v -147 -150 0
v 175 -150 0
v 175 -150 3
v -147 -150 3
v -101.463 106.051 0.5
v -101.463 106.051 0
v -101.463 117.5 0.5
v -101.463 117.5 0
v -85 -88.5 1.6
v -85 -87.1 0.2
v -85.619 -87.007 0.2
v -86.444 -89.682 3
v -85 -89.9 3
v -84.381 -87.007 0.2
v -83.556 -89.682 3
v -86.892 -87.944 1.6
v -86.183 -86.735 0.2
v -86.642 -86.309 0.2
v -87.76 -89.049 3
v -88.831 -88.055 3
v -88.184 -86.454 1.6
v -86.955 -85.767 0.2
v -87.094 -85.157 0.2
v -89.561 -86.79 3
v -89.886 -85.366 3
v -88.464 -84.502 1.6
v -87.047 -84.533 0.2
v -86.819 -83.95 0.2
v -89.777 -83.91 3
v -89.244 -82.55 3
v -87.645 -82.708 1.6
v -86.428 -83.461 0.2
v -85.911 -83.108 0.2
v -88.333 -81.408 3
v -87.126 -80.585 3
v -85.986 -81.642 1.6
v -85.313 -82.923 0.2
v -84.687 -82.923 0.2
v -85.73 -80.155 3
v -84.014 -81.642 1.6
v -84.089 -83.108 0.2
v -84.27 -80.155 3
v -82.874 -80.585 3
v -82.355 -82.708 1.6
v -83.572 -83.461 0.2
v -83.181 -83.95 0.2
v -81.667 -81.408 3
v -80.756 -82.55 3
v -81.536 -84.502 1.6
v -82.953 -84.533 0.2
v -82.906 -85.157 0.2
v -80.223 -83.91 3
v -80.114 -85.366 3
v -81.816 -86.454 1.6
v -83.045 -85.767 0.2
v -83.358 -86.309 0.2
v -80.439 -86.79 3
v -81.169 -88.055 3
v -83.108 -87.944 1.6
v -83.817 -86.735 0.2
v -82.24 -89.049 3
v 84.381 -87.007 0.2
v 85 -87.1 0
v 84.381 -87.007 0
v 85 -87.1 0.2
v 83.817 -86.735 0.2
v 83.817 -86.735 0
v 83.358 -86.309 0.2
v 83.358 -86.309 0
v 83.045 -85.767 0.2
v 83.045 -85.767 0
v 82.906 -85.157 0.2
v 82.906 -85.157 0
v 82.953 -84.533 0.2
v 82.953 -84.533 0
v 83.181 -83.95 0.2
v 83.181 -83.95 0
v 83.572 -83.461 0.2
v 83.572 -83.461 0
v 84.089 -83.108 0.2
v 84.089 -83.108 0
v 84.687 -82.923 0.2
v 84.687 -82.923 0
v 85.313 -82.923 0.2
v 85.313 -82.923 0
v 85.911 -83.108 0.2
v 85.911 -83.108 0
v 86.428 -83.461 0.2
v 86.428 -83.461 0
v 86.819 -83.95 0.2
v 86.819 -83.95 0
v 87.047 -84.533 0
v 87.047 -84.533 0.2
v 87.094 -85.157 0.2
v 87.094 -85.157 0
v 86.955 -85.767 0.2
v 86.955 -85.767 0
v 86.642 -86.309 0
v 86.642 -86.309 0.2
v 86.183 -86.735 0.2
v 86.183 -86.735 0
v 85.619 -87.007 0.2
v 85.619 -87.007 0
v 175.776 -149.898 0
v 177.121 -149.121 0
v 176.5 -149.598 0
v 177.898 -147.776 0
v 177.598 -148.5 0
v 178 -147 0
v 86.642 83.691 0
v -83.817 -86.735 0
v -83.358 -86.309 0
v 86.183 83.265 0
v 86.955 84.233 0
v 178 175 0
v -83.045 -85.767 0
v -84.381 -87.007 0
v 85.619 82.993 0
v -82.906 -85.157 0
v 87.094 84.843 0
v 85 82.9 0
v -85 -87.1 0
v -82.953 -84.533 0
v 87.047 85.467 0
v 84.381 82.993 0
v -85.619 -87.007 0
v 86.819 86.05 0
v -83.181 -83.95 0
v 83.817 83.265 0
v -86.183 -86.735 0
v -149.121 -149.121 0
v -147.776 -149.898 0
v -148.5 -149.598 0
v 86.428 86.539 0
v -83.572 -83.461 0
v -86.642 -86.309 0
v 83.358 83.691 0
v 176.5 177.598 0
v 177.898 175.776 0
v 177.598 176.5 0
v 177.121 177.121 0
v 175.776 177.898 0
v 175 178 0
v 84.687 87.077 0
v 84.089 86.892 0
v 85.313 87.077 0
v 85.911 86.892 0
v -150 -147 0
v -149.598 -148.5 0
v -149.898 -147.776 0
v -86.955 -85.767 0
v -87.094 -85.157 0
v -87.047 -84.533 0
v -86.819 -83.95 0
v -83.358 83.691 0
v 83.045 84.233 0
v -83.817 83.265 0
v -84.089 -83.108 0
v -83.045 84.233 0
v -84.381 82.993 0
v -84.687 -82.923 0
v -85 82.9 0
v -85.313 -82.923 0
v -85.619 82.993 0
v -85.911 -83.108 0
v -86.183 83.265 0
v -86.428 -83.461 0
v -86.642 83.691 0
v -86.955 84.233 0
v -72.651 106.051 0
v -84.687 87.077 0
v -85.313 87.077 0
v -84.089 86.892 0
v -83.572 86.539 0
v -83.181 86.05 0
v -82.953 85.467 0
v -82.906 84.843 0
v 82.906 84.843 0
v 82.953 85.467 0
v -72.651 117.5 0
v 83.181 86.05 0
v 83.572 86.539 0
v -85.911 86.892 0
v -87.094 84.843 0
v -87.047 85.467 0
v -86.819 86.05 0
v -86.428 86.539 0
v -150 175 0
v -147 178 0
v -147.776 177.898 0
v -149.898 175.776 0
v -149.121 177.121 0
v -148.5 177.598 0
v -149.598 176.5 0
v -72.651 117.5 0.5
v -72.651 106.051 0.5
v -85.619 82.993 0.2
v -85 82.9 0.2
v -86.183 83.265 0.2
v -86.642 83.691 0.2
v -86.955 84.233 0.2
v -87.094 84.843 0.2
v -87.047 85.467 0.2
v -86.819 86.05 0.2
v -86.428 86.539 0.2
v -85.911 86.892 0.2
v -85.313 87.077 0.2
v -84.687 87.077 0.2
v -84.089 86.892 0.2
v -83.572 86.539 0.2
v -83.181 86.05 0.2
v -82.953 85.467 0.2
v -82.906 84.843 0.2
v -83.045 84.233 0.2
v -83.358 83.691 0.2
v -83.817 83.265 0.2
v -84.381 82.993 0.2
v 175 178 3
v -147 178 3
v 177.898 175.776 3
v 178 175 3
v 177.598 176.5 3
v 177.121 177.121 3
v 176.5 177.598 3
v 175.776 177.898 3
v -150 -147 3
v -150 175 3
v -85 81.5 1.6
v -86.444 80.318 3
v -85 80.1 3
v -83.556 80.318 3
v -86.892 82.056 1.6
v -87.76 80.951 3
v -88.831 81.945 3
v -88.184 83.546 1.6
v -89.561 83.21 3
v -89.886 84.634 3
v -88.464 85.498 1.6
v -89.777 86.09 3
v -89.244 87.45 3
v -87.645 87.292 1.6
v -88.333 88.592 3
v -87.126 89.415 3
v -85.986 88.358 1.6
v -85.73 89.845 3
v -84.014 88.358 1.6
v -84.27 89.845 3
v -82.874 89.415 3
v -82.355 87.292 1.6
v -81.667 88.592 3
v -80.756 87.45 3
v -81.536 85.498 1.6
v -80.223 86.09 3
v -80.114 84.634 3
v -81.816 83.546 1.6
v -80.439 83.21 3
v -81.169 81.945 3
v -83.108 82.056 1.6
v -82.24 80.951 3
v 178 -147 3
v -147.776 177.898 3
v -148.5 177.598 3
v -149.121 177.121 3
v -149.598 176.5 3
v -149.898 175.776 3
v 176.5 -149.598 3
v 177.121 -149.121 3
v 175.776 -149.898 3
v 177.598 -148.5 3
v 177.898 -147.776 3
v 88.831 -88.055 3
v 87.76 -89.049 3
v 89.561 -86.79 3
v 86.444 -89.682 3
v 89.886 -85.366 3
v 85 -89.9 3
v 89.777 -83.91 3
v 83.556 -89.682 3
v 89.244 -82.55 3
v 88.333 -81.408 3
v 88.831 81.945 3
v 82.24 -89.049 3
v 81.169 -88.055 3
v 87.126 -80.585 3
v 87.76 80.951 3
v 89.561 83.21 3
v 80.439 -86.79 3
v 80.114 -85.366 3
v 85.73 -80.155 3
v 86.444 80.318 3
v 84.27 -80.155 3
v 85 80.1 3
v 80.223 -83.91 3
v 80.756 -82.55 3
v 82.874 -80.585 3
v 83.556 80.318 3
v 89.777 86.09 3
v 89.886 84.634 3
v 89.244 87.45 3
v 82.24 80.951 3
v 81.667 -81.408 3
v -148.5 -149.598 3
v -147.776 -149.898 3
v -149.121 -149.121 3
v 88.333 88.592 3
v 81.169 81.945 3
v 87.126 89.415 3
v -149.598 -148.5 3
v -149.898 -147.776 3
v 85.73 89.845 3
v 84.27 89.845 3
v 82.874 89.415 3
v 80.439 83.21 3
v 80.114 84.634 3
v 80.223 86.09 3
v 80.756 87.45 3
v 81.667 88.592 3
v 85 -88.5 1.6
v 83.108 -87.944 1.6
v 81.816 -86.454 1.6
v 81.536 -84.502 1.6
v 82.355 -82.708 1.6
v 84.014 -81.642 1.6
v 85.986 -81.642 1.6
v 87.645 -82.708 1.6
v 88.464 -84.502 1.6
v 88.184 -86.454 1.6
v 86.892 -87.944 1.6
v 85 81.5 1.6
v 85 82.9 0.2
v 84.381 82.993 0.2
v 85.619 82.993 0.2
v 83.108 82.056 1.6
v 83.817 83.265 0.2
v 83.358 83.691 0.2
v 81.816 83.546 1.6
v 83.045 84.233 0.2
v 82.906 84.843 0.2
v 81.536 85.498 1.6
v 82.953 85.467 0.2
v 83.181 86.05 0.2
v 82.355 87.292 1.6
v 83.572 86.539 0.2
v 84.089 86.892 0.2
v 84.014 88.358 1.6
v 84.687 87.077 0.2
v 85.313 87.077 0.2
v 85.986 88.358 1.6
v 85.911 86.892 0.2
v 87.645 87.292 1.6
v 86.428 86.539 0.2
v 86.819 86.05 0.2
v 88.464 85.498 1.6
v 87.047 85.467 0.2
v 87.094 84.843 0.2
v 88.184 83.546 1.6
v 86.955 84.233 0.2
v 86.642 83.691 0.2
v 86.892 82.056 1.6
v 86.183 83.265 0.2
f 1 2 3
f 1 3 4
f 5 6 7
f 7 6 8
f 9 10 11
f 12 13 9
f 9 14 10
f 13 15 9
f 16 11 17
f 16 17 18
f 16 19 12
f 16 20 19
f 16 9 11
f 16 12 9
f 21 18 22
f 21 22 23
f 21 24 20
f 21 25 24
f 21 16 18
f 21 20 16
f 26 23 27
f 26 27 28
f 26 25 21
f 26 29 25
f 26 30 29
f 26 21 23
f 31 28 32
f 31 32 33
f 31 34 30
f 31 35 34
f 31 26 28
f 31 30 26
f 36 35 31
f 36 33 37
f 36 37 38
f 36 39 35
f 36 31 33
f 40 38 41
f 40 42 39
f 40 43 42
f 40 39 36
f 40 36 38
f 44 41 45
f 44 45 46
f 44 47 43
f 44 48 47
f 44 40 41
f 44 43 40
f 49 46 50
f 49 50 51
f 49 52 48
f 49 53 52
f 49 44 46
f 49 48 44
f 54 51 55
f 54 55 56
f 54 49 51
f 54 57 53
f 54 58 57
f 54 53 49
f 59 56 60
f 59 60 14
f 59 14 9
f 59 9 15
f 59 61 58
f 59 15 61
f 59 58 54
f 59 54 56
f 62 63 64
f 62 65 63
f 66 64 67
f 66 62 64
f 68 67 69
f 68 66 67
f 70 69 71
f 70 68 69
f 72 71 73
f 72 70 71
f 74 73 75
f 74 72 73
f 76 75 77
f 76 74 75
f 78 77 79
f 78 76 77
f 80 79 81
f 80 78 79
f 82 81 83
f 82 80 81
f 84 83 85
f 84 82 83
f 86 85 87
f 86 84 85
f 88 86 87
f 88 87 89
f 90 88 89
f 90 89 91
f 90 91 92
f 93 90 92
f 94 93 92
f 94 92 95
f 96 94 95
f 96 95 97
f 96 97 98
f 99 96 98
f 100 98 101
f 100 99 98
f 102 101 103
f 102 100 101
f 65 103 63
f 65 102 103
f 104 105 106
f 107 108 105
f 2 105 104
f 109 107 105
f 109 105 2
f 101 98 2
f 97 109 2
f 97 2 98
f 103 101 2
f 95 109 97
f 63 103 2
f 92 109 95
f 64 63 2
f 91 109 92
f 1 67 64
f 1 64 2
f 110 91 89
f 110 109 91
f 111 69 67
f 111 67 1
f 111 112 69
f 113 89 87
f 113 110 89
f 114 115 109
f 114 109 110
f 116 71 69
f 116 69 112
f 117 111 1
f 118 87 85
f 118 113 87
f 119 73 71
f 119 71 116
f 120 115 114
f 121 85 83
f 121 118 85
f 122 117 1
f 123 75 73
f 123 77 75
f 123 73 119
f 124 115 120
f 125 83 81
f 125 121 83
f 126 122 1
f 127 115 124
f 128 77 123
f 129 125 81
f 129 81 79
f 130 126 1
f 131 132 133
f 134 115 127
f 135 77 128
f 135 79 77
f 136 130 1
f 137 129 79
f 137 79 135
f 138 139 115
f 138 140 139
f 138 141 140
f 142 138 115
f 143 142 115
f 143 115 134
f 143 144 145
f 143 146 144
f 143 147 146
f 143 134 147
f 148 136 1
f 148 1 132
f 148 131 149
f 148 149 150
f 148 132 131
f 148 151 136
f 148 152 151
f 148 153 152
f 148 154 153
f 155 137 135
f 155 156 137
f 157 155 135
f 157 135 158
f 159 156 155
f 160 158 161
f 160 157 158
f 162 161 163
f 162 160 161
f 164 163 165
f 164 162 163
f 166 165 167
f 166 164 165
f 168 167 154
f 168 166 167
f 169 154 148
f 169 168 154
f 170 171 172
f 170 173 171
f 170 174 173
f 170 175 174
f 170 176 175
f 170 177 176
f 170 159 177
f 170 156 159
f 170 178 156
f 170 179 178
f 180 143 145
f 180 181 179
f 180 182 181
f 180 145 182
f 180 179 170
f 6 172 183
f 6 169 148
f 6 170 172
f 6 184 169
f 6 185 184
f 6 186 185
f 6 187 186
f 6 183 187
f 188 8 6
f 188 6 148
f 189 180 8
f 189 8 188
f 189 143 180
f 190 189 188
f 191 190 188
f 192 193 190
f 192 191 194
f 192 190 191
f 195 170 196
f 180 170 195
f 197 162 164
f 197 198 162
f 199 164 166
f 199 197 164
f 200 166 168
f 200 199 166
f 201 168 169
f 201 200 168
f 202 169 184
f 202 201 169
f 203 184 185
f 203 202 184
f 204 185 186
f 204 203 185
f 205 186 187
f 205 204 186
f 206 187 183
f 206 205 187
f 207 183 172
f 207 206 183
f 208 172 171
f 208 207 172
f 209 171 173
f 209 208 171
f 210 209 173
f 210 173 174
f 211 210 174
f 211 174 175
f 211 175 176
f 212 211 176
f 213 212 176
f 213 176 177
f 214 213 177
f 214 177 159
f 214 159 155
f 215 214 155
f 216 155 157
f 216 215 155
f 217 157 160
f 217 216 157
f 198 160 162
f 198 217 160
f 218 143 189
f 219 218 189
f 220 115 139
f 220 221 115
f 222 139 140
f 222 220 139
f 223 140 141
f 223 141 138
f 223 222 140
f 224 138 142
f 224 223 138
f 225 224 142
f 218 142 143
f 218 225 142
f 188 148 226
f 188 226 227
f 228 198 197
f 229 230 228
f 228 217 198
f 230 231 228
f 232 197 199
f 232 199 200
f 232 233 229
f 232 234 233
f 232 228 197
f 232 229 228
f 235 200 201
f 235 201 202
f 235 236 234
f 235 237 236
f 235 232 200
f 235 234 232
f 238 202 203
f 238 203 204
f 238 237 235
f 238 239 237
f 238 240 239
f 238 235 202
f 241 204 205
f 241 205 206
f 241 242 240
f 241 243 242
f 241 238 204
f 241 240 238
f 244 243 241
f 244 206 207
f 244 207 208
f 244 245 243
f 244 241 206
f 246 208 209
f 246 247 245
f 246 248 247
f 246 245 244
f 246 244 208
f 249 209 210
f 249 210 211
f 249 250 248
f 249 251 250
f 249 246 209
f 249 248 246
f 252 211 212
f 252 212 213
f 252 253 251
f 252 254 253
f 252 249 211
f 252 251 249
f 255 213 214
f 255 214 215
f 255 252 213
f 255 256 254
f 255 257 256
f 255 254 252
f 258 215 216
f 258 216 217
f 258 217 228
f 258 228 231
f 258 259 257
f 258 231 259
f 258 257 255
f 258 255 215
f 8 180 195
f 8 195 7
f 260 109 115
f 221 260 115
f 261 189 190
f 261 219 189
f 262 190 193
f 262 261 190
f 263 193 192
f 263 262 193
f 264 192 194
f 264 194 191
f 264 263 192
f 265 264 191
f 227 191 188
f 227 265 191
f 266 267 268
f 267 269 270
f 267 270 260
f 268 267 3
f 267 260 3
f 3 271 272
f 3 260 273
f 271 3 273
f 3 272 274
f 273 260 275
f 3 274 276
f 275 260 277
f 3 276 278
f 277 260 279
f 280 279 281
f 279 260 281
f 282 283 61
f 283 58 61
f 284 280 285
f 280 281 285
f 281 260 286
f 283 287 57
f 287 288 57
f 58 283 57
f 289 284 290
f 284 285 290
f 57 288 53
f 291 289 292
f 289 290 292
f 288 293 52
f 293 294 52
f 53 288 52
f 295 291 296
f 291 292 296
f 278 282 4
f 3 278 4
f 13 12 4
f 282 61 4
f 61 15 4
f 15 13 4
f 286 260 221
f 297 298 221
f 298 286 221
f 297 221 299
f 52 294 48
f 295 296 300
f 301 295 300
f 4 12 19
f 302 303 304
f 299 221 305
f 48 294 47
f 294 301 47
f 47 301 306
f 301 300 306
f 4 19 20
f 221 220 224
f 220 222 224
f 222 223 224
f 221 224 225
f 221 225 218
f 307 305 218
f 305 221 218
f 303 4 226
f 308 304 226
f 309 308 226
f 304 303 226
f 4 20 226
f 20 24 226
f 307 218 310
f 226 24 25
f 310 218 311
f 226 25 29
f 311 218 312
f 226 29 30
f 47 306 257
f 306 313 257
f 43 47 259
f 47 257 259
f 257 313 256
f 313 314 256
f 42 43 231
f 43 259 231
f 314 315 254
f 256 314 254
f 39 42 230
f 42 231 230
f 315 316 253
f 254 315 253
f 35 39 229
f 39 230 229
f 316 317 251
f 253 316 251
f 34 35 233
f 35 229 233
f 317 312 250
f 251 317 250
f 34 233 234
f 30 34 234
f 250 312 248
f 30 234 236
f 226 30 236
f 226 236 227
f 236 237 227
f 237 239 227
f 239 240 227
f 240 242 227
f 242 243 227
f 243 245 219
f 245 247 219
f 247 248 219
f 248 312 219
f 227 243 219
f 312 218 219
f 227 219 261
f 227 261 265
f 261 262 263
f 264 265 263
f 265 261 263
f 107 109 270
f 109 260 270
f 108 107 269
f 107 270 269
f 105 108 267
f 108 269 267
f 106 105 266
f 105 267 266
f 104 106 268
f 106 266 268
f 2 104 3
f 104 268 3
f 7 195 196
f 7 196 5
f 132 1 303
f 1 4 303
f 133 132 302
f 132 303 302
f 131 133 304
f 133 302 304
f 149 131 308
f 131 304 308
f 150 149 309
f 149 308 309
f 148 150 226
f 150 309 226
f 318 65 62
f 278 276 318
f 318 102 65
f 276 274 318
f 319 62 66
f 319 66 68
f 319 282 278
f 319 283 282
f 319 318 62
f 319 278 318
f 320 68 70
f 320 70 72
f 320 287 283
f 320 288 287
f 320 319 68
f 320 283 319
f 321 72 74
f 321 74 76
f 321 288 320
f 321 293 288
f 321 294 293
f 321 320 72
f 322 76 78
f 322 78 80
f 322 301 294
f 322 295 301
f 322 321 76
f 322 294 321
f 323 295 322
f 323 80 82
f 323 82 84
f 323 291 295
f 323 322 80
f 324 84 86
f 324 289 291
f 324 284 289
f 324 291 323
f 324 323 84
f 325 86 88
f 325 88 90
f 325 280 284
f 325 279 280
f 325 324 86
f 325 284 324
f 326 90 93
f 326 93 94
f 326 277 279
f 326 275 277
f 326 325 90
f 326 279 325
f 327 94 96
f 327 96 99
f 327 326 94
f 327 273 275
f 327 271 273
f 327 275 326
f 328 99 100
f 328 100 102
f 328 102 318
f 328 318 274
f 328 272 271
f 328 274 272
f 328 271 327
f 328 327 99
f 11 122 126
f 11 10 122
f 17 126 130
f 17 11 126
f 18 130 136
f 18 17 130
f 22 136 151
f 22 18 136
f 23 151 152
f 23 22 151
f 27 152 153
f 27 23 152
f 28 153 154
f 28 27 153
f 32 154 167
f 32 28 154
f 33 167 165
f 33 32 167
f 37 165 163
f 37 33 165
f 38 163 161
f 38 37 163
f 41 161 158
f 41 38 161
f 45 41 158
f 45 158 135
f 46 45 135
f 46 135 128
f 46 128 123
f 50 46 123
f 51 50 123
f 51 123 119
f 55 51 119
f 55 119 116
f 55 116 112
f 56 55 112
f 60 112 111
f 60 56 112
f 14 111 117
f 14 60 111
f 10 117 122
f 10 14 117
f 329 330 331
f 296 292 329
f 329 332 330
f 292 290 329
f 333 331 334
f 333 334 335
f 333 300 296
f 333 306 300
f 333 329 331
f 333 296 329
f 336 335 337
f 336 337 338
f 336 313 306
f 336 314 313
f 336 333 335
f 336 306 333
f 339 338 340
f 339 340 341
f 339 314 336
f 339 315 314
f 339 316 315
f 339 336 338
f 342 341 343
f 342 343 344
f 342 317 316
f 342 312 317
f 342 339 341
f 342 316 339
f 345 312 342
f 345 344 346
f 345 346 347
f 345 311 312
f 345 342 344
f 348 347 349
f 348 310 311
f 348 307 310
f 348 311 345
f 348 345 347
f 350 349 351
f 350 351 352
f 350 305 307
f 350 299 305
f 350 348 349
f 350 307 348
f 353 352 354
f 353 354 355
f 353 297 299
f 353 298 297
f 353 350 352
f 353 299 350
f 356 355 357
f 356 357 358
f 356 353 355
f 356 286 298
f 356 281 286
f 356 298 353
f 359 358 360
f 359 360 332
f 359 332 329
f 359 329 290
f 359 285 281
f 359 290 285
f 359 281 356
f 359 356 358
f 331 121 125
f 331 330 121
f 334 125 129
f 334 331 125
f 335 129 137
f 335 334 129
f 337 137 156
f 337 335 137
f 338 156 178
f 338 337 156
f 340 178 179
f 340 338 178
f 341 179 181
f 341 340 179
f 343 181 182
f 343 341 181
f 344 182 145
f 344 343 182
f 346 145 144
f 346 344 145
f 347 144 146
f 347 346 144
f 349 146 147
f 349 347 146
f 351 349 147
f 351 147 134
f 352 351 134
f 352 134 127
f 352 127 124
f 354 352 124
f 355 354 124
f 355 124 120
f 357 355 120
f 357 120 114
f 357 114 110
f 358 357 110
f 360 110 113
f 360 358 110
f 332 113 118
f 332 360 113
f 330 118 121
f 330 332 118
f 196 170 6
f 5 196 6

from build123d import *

# Parameters (mm, degrees)
SKETCH1_W                                      = 328
SKETCH1_H                                      = 328
BOSS_EXTRUDE1_DEPTH                            = 3
SKETCH2_W                                      = 28.812164255
SKETCH2_H                                      = 11.449209801
CUT_EXTRUDE1_DEPTH                             = 0.5
CSK_FOR_M3_5_FLAT_HEAD_MACHINE_SCREW1_AT_COUNT = 2
CSK_FOR_M3_5_FLAT_HEAD_MACHINE_SCREW1_AT_PITCH = 170
CSK_FOR_M3_5_FLAT_HEAD_MACHINE_SCREW_2_COUNT   = 2
CSK_FOR_M3_5_FLAT_HEAD_MACHINE_SCREW_2_PITCH   = 240.416305603
CSK_FOR_M3_5_FLAT_HEAD_MACHINE_SCREW_3_COUNT   = 2
CSK_FOR_M3_5_FLAT_HEAD_MACHINE_SCREW_3_PITCH   = 170
FILLET1_R                                      = 3


with BuildPart() as part:
    # Sketch1 → Boss-Extrude1 (new body)
    with BuildSketch(Plane(origin=(0, 0, 0), x_dir=(-1, 0, 0), z_dir=(0, 0, -1))):
        with Locations((-14, 14)):
            Rectangle(SKETCH1_W, SKETCH1_H)
    extrude(amount=-BOSS_EXTRUDE1_DEPTH)

    # Sketch2 → Cut-Extrude1 (cut)
    with BuildSketch(Plane(origin=(0, 0, 0), x_dir=(-1, 0, 0), z_dir=(0, 0, -1))):
        with Locations((87.056843615, 111.7753951)):
            Rectangle(SKETCH2_W, SKETCH2_H)
    extrude(amount=-CUT_EXTRUDE1_DEPTH, mode=Mode.SUBTRACT)

    # Sketch3 → CSK for M3.5 Flat Head Machine Screw1 (revolve, cut)
    with BuildSketch(Plane(origin=(-85, -85, 3), x_dir=(0, -1, 0), z_dir=(1, 0, 0))):
        Polygon((0, 0), (0, 3), (2.1, 3), (2.1, 2.8), (4.9, 0), align=None)
    csk_for_m3_5_flat_head_machine_screw1 = revolve(axis=Axis((-85, -85, 9.35), (0, 0, -1)), mode=Mode.SUBTRACT)

    # CSK for M3.5 Flat Head Machine Screw1 at: CSK for M3.5 Flat Head Machine Screw1 ×2
    with Locations(*[(i * CSK_FOR_M3_5_FLAT_HEAD_MACHINE_SCREW1_AT_PITCH, 0, 0) for i in range(1, CSK_FOR_M3_5_FLAT_HEAD_MACHINE_SCREW1_AT_COUNT)]):
        add(csk_for_m3_5_flat_head_machine_screw1, mode=Mode.SUBTRACT)

    # CSK for M3.5 Flat Head Machine Screw 2: CSK for M3.5 Flat Head Machine Screw1 ×2
    with Locations(*[Vector(0.707106781, 0.707106781, 0) * (i * CSK_FOR_M3_5_FLAT_HEAD_MACHINE_SCREW_2_PITCH) for i in range(1, CSK_FOR_M3_5_FLAT_HEAD_MACHINE_SCREW_2_COUNT)]):
        add(csk_for_m3_5_flat_head_machine_screw1, mode=Mode.SUBTRACT)

    # CSK for M3.5 Flat Head Machine Screw 3: CSK for M3.5 Flat Head Machine Screw1 ×2
    with Locations(*[(0, i * CSK_FOR_M3_5_FLAT_HEAD_MACHINE_SCREW_3_PITCH, 0) for i in range(1, CSK_FOR_M3_5_FLAT_HEAD_MACHINE_SCREW_3_COUNT)]):
        add(csk_for_m3_5_flat_head_machine_screw1, mode=Mode.SUBTRACT)

    # Fillet1
    fillet1_edges = [part.edges().sort_by_distance(p)[0] for p in [
        (178, -150, 1.5),
        (178, 178, 1.5),
        (-150, 178, 1.5),
        (-150, -150, 1.5),
    ]]
    fillet(fillet1_edges, radius=FILLET1_R)


solid = part.part
